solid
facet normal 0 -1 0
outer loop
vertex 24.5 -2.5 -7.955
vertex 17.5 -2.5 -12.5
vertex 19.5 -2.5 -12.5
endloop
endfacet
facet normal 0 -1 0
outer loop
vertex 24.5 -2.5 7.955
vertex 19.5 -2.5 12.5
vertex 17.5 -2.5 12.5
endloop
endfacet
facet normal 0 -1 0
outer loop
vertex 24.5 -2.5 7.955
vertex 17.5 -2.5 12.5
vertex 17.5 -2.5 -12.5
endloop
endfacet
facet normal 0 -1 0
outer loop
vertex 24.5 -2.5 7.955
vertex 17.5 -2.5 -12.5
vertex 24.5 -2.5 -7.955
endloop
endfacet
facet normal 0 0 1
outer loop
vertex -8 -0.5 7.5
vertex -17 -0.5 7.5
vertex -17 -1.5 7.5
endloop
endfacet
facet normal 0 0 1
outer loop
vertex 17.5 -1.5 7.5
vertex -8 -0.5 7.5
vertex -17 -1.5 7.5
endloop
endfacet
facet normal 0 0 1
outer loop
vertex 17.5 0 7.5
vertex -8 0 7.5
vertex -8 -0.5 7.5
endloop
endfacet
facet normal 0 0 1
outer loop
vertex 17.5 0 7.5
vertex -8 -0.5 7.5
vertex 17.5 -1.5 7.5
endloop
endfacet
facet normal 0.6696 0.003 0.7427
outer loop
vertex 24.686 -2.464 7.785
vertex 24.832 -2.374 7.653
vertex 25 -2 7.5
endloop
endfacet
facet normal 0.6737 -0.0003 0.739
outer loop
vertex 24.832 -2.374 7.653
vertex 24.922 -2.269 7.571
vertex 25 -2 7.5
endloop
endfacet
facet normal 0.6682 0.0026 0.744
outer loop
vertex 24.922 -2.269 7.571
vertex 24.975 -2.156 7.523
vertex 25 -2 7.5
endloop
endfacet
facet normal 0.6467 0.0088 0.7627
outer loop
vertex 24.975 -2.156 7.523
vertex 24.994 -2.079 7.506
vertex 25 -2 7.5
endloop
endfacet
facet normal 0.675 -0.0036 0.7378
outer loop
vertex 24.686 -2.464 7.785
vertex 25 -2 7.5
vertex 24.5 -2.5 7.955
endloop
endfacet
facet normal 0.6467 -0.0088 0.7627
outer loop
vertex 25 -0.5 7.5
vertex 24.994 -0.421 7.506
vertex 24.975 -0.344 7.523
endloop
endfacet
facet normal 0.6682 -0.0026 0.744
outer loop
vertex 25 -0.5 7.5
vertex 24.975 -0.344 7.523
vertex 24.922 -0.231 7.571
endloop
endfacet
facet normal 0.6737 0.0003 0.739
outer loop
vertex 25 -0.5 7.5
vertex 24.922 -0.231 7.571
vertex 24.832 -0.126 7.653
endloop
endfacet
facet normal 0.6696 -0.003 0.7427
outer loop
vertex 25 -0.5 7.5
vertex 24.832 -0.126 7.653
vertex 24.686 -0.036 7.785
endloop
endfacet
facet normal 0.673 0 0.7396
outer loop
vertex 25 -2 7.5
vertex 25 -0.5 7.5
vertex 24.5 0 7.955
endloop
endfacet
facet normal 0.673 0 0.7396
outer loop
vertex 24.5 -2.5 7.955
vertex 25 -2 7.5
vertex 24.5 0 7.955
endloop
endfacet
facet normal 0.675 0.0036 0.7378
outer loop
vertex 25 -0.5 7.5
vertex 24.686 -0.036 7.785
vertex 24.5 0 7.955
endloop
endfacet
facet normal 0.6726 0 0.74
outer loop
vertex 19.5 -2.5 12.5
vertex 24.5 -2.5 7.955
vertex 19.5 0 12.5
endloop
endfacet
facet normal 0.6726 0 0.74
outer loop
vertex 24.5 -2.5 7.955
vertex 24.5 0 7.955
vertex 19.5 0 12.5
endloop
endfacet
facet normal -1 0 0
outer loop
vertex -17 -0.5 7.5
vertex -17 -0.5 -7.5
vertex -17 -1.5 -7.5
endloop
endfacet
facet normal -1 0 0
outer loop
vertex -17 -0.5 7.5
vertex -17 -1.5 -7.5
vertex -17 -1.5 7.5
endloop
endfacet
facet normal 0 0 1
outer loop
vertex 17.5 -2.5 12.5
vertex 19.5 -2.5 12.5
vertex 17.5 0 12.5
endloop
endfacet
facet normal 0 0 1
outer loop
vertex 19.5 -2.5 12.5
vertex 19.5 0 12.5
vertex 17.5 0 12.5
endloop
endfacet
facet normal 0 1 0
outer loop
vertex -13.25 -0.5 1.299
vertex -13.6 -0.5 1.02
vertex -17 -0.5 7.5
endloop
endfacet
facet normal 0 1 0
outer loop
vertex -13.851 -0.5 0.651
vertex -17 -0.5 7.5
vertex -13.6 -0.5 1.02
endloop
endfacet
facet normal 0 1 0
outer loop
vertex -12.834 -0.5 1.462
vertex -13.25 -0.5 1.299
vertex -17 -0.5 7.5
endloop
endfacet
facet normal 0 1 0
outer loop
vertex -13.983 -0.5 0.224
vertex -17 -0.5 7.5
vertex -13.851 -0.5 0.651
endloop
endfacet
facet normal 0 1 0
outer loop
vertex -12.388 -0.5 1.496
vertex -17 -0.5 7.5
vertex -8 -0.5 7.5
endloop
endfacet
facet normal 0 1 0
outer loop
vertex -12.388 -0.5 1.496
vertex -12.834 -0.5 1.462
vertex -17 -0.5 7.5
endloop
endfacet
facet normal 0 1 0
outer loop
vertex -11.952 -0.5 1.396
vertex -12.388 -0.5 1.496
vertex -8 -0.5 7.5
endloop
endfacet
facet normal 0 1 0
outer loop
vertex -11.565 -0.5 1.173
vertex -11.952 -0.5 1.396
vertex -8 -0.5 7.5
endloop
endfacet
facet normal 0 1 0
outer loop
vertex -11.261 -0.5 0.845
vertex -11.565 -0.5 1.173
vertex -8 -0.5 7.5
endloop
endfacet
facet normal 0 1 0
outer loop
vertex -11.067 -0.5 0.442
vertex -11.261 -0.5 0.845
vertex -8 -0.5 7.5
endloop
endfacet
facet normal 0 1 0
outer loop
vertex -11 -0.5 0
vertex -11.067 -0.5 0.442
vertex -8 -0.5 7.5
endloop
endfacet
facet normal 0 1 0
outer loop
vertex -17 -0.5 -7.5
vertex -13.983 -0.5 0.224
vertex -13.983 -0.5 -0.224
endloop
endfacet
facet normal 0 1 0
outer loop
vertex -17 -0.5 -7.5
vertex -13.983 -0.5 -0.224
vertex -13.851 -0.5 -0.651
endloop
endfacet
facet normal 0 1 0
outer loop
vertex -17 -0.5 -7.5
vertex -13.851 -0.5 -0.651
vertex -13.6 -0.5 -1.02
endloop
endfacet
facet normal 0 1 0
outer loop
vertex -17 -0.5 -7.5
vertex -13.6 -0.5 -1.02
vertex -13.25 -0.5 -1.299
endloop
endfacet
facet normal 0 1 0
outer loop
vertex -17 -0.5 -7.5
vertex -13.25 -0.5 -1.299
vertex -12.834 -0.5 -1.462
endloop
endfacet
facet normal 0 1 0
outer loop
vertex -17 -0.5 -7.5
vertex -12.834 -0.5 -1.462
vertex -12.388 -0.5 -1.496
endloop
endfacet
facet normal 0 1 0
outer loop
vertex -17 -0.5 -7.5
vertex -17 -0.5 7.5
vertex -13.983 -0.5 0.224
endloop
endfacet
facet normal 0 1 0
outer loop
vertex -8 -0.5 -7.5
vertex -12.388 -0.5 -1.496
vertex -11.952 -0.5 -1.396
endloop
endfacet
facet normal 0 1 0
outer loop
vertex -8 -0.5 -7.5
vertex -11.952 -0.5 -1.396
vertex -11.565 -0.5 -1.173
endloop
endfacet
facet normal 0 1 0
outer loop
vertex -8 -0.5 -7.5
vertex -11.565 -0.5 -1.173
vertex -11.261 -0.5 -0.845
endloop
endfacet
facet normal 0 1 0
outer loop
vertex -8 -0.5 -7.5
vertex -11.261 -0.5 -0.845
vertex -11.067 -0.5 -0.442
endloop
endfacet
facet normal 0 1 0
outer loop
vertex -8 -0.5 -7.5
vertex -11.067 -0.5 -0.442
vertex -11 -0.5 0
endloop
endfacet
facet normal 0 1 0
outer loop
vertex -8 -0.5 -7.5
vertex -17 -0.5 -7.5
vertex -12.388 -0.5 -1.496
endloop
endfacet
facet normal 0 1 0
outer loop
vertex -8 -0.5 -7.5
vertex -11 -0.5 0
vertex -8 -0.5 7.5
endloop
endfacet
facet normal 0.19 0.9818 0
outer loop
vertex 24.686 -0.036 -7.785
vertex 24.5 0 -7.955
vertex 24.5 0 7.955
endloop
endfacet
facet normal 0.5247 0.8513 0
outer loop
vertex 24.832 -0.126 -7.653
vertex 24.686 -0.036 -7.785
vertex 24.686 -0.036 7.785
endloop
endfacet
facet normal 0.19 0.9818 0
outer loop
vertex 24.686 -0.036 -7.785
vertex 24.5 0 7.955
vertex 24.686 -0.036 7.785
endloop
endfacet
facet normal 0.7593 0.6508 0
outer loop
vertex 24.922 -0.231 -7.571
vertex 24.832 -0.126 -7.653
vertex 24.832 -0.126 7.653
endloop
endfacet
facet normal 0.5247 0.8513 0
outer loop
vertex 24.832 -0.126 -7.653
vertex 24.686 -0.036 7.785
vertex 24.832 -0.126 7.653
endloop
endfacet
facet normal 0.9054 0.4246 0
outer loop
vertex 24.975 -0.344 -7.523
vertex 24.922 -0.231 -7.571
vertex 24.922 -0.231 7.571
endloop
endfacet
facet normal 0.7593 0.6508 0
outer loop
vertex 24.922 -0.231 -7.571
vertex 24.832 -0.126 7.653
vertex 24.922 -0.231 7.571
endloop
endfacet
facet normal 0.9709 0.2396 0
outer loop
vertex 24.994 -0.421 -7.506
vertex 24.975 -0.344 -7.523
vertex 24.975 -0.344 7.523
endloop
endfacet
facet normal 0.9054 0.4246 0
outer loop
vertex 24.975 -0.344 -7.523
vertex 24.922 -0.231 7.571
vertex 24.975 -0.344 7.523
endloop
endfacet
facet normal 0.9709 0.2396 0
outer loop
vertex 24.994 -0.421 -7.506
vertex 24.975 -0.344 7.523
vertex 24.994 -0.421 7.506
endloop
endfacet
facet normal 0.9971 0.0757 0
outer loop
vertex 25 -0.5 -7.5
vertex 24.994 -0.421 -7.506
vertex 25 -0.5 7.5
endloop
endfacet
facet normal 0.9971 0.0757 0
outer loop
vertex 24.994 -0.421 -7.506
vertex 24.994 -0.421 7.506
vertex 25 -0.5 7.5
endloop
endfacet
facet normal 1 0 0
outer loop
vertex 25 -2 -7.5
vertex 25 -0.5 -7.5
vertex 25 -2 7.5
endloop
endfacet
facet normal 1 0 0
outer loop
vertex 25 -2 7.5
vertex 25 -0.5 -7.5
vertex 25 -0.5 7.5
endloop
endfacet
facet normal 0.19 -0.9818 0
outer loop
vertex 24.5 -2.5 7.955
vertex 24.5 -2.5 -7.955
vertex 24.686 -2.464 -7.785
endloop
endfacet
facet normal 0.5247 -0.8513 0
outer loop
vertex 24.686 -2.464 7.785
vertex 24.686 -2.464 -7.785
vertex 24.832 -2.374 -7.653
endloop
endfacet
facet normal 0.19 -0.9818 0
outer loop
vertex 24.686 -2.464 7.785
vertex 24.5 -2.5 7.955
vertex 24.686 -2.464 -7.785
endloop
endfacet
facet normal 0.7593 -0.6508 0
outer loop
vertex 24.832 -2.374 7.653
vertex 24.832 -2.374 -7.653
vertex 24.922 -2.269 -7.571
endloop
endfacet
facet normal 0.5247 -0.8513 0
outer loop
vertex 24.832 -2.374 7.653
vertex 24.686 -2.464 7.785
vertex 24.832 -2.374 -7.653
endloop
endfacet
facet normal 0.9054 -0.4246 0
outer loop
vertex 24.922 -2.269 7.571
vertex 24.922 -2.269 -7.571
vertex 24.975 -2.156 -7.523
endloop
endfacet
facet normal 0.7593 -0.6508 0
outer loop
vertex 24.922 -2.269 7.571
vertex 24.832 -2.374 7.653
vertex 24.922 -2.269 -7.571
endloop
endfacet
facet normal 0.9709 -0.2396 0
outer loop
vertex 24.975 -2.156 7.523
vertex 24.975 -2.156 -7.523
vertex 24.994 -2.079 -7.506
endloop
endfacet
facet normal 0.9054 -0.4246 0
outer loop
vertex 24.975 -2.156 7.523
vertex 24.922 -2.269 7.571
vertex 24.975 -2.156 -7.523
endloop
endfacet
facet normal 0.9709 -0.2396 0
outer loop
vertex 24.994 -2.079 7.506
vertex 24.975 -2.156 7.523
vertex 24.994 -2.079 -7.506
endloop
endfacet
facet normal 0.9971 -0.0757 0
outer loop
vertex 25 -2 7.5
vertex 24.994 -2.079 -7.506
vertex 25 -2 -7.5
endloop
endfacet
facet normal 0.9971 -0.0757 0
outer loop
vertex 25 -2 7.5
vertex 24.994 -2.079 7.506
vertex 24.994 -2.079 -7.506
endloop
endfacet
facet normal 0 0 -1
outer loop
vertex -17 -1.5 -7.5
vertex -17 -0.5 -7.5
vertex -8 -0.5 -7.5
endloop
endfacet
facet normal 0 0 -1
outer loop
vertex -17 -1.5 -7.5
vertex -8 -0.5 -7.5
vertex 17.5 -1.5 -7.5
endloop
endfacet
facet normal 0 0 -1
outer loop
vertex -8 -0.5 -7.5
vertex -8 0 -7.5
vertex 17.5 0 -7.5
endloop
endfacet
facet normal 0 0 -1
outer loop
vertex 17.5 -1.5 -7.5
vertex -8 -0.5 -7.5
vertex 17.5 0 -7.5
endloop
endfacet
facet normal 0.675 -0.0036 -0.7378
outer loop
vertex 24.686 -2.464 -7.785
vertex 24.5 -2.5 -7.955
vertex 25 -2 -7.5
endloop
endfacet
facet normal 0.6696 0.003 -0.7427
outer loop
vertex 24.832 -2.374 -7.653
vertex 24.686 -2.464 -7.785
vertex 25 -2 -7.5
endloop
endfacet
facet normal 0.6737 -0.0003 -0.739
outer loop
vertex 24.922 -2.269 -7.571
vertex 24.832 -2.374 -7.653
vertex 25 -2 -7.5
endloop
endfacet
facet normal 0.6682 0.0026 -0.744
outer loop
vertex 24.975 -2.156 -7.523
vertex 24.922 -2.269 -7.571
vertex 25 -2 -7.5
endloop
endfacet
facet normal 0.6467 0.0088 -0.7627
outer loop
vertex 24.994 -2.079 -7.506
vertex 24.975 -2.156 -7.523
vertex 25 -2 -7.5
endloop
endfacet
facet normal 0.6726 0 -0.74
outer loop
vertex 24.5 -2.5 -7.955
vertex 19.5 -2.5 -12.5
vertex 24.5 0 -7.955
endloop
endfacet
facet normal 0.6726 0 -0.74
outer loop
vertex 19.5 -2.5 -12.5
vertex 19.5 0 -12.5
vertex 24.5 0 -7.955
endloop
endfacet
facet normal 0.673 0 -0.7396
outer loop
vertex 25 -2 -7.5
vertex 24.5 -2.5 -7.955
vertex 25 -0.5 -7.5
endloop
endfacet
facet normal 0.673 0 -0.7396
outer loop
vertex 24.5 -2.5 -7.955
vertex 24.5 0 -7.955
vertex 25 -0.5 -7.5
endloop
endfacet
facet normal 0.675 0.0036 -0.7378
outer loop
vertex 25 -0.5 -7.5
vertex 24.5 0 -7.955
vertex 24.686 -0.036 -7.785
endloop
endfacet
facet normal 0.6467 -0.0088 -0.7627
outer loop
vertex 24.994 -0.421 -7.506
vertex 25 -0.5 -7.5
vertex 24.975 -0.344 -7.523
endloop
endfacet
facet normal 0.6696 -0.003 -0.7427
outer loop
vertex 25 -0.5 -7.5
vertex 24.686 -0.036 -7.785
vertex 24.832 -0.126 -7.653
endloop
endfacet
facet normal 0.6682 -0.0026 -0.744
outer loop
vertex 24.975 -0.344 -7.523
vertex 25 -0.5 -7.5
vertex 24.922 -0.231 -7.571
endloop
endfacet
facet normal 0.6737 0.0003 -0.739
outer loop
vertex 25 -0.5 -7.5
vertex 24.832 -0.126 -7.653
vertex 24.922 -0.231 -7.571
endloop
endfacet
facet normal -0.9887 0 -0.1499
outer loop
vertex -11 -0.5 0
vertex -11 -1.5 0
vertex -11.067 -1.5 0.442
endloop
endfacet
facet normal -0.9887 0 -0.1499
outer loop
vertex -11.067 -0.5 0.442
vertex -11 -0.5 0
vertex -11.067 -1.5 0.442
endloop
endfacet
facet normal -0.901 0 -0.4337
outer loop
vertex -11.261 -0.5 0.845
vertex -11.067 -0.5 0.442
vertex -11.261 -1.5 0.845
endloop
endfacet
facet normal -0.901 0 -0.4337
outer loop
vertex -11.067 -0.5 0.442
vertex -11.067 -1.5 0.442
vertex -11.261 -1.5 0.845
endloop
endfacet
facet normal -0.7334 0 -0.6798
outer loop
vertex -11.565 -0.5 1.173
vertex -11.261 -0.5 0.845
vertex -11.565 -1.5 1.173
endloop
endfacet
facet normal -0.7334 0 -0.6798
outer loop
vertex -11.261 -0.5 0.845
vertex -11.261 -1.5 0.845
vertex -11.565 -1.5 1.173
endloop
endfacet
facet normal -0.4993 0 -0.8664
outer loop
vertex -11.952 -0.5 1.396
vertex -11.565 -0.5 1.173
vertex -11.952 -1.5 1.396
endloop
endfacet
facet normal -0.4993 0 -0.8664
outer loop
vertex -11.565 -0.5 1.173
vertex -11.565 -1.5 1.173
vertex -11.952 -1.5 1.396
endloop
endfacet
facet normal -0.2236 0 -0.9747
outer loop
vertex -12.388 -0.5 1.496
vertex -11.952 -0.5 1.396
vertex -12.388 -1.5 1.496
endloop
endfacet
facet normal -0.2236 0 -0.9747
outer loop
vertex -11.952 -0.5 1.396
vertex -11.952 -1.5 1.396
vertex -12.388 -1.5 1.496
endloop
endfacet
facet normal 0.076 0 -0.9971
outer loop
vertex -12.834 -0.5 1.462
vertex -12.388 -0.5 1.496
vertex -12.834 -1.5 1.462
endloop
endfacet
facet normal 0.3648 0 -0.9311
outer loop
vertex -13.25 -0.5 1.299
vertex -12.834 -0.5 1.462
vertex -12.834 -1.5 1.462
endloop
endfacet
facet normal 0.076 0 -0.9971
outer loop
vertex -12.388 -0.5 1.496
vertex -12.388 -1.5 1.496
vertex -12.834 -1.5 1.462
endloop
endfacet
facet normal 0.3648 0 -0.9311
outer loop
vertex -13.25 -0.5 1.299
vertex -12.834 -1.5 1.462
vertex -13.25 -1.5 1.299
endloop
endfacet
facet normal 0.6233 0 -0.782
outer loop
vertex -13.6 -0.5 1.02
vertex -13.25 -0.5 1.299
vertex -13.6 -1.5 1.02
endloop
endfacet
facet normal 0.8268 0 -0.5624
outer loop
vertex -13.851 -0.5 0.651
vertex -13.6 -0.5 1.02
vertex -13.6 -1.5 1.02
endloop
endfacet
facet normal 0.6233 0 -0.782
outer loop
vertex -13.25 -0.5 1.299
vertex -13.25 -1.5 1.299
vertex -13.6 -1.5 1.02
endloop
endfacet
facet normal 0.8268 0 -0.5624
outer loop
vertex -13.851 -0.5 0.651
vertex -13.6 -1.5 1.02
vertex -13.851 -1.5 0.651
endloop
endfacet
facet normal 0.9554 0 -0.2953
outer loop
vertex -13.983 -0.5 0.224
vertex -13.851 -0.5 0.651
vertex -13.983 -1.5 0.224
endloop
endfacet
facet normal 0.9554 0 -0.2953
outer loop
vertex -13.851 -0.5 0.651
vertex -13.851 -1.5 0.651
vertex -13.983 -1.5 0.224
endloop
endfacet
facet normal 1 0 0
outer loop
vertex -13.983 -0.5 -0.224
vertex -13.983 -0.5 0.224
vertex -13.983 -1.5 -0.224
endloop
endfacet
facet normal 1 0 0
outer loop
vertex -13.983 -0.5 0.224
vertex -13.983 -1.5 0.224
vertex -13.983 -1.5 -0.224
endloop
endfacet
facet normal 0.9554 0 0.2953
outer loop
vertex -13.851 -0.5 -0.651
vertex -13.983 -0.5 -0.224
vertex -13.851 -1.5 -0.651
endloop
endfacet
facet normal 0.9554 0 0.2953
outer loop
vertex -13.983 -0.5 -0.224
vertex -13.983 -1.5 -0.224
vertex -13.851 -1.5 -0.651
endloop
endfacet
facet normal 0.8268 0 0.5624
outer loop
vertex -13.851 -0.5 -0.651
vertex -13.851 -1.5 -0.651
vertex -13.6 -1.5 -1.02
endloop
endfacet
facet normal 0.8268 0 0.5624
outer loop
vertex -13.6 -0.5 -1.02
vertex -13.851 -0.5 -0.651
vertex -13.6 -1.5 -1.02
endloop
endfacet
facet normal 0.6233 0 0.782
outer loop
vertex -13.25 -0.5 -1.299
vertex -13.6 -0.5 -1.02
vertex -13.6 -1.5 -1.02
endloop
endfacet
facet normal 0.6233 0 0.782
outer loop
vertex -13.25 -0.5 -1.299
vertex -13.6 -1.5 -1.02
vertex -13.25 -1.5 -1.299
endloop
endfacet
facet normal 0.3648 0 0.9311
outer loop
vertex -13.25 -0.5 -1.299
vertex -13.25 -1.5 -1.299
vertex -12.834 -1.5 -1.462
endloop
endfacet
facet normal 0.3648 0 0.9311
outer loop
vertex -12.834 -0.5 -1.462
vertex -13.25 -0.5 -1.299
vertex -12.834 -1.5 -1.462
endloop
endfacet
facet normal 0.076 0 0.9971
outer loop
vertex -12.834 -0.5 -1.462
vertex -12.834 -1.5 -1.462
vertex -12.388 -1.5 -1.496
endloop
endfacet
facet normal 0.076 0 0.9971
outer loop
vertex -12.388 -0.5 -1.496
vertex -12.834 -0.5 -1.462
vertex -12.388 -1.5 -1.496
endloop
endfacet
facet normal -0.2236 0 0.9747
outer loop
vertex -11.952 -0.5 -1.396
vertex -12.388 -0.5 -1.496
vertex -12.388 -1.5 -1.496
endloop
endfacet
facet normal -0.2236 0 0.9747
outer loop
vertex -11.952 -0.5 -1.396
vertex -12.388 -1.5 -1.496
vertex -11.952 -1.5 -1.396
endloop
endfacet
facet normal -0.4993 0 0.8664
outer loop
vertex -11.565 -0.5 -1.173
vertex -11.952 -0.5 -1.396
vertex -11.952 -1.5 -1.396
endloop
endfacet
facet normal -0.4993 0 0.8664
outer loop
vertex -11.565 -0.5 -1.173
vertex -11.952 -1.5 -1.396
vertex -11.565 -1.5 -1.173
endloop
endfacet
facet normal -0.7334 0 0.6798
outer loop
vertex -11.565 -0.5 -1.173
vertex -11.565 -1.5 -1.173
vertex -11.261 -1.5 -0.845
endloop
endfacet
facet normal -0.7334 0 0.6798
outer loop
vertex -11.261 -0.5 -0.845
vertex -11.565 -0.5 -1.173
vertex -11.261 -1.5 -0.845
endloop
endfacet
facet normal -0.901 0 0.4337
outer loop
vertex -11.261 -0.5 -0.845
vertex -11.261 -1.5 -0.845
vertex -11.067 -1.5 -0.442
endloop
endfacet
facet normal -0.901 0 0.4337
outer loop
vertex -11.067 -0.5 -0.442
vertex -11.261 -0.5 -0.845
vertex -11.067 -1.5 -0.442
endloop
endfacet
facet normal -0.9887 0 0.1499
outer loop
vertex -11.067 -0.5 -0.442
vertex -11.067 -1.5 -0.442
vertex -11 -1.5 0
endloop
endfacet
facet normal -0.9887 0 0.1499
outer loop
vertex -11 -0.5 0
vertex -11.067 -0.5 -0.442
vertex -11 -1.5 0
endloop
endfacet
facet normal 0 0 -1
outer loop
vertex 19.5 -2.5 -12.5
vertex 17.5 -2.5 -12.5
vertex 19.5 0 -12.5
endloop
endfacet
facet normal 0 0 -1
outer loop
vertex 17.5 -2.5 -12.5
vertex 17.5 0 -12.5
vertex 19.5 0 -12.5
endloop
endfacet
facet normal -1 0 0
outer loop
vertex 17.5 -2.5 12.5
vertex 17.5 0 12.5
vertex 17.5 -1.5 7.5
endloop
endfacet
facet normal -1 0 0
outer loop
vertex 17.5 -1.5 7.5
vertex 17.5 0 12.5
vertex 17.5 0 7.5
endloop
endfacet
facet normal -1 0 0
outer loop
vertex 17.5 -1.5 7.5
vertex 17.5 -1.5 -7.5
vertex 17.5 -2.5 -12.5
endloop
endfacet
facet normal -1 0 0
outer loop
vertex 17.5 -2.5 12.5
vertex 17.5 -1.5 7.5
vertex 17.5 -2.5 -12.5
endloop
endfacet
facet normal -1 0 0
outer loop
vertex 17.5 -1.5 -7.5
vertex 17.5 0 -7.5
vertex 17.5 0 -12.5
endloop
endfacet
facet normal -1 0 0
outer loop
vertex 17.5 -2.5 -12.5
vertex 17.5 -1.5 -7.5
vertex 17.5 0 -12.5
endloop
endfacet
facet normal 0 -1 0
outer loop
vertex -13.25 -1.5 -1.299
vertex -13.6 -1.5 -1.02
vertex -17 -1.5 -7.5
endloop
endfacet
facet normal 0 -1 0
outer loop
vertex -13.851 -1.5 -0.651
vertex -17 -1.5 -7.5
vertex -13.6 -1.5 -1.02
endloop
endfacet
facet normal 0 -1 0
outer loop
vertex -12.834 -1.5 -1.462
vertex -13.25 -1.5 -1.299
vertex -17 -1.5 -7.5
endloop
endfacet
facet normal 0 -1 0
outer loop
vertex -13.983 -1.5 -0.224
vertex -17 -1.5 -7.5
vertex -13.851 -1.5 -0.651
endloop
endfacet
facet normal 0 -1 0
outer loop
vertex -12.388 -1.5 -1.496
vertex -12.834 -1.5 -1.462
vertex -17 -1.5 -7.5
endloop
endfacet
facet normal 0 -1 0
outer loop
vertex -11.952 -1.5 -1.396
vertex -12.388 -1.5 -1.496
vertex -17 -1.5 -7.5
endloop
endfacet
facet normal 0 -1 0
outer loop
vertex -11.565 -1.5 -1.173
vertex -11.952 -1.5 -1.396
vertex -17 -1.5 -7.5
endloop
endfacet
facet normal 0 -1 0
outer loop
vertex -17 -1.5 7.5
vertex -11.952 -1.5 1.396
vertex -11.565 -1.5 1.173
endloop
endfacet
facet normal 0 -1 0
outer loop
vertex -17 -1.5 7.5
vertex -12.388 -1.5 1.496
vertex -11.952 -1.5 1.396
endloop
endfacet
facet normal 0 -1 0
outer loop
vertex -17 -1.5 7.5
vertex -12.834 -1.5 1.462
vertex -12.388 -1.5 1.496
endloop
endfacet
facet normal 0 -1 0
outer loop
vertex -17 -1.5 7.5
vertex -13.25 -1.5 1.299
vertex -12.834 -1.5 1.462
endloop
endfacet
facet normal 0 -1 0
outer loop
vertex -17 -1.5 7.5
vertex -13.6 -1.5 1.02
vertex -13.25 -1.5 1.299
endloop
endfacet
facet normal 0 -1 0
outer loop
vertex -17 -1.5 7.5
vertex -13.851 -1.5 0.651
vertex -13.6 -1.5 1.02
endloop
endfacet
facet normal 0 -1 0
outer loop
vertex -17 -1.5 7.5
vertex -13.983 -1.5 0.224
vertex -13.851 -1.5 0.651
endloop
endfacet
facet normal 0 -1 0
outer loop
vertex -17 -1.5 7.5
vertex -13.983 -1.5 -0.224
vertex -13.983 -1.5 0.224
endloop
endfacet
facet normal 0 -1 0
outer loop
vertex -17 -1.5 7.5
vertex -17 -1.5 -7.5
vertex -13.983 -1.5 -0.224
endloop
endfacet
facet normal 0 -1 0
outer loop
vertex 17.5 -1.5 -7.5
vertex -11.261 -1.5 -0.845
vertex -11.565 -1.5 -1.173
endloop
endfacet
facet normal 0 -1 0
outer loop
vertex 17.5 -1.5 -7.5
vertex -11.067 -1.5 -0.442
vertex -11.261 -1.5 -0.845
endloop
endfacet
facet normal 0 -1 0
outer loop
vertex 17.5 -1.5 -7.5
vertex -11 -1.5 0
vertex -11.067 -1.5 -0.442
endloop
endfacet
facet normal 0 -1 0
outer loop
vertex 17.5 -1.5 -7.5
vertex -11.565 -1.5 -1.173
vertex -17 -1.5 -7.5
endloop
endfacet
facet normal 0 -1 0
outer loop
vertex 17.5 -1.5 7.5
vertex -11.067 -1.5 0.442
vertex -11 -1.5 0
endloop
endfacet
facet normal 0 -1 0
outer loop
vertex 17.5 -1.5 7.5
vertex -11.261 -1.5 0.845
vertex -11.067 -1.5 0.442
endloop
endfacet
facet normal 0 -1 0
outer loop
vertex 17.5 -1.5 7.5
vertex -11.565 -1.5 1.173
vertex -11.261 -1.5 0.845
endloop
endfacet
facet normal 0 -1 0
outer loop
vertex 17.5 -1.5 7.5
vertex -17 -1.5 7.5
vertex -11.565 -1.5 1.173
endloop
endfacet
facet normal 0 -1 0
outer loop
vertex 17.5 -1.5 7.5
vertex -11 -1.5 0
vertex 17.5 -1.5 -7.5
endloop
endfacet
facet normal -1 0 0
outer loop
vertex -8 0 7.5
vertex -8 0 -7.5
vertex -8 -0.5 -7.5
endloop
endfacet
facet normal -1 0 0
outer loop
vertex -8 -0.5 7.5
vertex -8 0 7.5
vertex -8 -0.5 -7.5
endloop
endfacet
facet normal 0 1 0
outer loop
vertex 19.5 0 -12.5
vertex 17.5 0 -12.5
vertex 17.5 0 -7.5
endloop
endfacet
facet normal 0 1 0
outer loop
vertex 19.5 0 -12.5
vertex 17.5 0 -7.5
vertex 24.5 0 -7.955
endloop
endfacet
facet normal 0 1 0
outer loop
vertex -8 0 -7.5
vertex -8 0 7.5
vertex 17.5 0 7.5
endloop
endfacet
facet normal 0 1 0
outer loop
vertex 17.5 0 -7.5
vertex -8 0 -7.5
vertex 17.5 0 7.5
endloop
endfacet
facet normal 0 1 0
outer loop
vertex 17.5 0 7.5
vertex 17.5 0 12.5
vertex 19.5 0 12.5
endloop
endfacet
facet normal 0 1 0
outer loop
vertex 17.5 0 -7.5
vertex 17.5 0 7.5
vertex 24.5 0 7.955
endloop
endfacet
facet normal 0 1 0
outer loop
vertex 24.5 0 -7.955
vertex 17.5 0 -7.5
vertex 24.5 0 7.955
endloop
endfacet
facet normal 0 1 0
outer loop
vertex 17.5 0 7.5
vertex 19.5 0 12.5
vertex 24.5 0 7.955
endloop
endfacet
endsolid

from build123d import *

# Parameters (mm, degrees)
F0_W     = 42
F0_H     = 15
F1_DEPTH = 1.5
F2_R     = 1.5
F3_DEPTH = 1.501
F5_DEPTH = 1.5
F6_W     = 9
F6_H     = 0.5
F7_DEPTH = 20.001
F9_DEPTH = 1
F10_R    = 0.5


with BuildPart() as f1:
    # F0 (on Front) → F1 (new body)
    with BuildSketch(Plane.XZ):
        with Locations((4, 0)):
            Rectangle(F0_W, F0_H)
    extrude(amount=F1_DEPTH)

    # F2 (on face) → F3 (cut, through all)
    with BuildSketch(Plane.XZ.offset(1.5)):
        with Locations((-12.5, 0)):
            Circle(F2_R)
    extrude(amount=-F3_DEPTH, mode=Mode.SUBTRACT)

    # F4 (on face) → F5 (join, through all)
    with BuildSketch(Plane.XZ.offset(1.5)):
        Polygon((19.5, -12.5), (25, -7.5), (17.5, -7.5), (17.5, -12.5), align=None)
        Polygon((17.5, 7.5), (25, 7.5), (19.5, 12.5), (17.5, 12.5), align=None)
    extrude(amount=-F5_DEPTH)

    # F6 (on face) → F7 (cut, through all)
    with BuildSketch(Plane(origin=(0, 0, -7.5), x_dir=(1, 0, 0), z_dir=(0, 0, -1))):
        with Locations((-12.5, 0.25)):
            Rectangle(F6_W, F6_H)
    extrude(amount=-F7_DEPTH, mode=Mode.SUBTRACT)

    # F8 (on face) → F9 (join)
    with BuildSketch(Plane.XZ.offset(1.5)):
        Polygon((25, 7.5), (19.5, 12.5), (17.5, 12.5), (17.5, -12.5), (19.5, -12.5), (25, -7.5), align=None)
    extrude(amount=F9_DEPTH)

    # F10
    f10_edges = [f1.edges().sort_by_distance(p)[0] for p in [
        (25, -2.5, 0),
        (25, 0, 0),
    ]]
    fillet(f10_edges, radius=F10_R)


solid = f1.part
